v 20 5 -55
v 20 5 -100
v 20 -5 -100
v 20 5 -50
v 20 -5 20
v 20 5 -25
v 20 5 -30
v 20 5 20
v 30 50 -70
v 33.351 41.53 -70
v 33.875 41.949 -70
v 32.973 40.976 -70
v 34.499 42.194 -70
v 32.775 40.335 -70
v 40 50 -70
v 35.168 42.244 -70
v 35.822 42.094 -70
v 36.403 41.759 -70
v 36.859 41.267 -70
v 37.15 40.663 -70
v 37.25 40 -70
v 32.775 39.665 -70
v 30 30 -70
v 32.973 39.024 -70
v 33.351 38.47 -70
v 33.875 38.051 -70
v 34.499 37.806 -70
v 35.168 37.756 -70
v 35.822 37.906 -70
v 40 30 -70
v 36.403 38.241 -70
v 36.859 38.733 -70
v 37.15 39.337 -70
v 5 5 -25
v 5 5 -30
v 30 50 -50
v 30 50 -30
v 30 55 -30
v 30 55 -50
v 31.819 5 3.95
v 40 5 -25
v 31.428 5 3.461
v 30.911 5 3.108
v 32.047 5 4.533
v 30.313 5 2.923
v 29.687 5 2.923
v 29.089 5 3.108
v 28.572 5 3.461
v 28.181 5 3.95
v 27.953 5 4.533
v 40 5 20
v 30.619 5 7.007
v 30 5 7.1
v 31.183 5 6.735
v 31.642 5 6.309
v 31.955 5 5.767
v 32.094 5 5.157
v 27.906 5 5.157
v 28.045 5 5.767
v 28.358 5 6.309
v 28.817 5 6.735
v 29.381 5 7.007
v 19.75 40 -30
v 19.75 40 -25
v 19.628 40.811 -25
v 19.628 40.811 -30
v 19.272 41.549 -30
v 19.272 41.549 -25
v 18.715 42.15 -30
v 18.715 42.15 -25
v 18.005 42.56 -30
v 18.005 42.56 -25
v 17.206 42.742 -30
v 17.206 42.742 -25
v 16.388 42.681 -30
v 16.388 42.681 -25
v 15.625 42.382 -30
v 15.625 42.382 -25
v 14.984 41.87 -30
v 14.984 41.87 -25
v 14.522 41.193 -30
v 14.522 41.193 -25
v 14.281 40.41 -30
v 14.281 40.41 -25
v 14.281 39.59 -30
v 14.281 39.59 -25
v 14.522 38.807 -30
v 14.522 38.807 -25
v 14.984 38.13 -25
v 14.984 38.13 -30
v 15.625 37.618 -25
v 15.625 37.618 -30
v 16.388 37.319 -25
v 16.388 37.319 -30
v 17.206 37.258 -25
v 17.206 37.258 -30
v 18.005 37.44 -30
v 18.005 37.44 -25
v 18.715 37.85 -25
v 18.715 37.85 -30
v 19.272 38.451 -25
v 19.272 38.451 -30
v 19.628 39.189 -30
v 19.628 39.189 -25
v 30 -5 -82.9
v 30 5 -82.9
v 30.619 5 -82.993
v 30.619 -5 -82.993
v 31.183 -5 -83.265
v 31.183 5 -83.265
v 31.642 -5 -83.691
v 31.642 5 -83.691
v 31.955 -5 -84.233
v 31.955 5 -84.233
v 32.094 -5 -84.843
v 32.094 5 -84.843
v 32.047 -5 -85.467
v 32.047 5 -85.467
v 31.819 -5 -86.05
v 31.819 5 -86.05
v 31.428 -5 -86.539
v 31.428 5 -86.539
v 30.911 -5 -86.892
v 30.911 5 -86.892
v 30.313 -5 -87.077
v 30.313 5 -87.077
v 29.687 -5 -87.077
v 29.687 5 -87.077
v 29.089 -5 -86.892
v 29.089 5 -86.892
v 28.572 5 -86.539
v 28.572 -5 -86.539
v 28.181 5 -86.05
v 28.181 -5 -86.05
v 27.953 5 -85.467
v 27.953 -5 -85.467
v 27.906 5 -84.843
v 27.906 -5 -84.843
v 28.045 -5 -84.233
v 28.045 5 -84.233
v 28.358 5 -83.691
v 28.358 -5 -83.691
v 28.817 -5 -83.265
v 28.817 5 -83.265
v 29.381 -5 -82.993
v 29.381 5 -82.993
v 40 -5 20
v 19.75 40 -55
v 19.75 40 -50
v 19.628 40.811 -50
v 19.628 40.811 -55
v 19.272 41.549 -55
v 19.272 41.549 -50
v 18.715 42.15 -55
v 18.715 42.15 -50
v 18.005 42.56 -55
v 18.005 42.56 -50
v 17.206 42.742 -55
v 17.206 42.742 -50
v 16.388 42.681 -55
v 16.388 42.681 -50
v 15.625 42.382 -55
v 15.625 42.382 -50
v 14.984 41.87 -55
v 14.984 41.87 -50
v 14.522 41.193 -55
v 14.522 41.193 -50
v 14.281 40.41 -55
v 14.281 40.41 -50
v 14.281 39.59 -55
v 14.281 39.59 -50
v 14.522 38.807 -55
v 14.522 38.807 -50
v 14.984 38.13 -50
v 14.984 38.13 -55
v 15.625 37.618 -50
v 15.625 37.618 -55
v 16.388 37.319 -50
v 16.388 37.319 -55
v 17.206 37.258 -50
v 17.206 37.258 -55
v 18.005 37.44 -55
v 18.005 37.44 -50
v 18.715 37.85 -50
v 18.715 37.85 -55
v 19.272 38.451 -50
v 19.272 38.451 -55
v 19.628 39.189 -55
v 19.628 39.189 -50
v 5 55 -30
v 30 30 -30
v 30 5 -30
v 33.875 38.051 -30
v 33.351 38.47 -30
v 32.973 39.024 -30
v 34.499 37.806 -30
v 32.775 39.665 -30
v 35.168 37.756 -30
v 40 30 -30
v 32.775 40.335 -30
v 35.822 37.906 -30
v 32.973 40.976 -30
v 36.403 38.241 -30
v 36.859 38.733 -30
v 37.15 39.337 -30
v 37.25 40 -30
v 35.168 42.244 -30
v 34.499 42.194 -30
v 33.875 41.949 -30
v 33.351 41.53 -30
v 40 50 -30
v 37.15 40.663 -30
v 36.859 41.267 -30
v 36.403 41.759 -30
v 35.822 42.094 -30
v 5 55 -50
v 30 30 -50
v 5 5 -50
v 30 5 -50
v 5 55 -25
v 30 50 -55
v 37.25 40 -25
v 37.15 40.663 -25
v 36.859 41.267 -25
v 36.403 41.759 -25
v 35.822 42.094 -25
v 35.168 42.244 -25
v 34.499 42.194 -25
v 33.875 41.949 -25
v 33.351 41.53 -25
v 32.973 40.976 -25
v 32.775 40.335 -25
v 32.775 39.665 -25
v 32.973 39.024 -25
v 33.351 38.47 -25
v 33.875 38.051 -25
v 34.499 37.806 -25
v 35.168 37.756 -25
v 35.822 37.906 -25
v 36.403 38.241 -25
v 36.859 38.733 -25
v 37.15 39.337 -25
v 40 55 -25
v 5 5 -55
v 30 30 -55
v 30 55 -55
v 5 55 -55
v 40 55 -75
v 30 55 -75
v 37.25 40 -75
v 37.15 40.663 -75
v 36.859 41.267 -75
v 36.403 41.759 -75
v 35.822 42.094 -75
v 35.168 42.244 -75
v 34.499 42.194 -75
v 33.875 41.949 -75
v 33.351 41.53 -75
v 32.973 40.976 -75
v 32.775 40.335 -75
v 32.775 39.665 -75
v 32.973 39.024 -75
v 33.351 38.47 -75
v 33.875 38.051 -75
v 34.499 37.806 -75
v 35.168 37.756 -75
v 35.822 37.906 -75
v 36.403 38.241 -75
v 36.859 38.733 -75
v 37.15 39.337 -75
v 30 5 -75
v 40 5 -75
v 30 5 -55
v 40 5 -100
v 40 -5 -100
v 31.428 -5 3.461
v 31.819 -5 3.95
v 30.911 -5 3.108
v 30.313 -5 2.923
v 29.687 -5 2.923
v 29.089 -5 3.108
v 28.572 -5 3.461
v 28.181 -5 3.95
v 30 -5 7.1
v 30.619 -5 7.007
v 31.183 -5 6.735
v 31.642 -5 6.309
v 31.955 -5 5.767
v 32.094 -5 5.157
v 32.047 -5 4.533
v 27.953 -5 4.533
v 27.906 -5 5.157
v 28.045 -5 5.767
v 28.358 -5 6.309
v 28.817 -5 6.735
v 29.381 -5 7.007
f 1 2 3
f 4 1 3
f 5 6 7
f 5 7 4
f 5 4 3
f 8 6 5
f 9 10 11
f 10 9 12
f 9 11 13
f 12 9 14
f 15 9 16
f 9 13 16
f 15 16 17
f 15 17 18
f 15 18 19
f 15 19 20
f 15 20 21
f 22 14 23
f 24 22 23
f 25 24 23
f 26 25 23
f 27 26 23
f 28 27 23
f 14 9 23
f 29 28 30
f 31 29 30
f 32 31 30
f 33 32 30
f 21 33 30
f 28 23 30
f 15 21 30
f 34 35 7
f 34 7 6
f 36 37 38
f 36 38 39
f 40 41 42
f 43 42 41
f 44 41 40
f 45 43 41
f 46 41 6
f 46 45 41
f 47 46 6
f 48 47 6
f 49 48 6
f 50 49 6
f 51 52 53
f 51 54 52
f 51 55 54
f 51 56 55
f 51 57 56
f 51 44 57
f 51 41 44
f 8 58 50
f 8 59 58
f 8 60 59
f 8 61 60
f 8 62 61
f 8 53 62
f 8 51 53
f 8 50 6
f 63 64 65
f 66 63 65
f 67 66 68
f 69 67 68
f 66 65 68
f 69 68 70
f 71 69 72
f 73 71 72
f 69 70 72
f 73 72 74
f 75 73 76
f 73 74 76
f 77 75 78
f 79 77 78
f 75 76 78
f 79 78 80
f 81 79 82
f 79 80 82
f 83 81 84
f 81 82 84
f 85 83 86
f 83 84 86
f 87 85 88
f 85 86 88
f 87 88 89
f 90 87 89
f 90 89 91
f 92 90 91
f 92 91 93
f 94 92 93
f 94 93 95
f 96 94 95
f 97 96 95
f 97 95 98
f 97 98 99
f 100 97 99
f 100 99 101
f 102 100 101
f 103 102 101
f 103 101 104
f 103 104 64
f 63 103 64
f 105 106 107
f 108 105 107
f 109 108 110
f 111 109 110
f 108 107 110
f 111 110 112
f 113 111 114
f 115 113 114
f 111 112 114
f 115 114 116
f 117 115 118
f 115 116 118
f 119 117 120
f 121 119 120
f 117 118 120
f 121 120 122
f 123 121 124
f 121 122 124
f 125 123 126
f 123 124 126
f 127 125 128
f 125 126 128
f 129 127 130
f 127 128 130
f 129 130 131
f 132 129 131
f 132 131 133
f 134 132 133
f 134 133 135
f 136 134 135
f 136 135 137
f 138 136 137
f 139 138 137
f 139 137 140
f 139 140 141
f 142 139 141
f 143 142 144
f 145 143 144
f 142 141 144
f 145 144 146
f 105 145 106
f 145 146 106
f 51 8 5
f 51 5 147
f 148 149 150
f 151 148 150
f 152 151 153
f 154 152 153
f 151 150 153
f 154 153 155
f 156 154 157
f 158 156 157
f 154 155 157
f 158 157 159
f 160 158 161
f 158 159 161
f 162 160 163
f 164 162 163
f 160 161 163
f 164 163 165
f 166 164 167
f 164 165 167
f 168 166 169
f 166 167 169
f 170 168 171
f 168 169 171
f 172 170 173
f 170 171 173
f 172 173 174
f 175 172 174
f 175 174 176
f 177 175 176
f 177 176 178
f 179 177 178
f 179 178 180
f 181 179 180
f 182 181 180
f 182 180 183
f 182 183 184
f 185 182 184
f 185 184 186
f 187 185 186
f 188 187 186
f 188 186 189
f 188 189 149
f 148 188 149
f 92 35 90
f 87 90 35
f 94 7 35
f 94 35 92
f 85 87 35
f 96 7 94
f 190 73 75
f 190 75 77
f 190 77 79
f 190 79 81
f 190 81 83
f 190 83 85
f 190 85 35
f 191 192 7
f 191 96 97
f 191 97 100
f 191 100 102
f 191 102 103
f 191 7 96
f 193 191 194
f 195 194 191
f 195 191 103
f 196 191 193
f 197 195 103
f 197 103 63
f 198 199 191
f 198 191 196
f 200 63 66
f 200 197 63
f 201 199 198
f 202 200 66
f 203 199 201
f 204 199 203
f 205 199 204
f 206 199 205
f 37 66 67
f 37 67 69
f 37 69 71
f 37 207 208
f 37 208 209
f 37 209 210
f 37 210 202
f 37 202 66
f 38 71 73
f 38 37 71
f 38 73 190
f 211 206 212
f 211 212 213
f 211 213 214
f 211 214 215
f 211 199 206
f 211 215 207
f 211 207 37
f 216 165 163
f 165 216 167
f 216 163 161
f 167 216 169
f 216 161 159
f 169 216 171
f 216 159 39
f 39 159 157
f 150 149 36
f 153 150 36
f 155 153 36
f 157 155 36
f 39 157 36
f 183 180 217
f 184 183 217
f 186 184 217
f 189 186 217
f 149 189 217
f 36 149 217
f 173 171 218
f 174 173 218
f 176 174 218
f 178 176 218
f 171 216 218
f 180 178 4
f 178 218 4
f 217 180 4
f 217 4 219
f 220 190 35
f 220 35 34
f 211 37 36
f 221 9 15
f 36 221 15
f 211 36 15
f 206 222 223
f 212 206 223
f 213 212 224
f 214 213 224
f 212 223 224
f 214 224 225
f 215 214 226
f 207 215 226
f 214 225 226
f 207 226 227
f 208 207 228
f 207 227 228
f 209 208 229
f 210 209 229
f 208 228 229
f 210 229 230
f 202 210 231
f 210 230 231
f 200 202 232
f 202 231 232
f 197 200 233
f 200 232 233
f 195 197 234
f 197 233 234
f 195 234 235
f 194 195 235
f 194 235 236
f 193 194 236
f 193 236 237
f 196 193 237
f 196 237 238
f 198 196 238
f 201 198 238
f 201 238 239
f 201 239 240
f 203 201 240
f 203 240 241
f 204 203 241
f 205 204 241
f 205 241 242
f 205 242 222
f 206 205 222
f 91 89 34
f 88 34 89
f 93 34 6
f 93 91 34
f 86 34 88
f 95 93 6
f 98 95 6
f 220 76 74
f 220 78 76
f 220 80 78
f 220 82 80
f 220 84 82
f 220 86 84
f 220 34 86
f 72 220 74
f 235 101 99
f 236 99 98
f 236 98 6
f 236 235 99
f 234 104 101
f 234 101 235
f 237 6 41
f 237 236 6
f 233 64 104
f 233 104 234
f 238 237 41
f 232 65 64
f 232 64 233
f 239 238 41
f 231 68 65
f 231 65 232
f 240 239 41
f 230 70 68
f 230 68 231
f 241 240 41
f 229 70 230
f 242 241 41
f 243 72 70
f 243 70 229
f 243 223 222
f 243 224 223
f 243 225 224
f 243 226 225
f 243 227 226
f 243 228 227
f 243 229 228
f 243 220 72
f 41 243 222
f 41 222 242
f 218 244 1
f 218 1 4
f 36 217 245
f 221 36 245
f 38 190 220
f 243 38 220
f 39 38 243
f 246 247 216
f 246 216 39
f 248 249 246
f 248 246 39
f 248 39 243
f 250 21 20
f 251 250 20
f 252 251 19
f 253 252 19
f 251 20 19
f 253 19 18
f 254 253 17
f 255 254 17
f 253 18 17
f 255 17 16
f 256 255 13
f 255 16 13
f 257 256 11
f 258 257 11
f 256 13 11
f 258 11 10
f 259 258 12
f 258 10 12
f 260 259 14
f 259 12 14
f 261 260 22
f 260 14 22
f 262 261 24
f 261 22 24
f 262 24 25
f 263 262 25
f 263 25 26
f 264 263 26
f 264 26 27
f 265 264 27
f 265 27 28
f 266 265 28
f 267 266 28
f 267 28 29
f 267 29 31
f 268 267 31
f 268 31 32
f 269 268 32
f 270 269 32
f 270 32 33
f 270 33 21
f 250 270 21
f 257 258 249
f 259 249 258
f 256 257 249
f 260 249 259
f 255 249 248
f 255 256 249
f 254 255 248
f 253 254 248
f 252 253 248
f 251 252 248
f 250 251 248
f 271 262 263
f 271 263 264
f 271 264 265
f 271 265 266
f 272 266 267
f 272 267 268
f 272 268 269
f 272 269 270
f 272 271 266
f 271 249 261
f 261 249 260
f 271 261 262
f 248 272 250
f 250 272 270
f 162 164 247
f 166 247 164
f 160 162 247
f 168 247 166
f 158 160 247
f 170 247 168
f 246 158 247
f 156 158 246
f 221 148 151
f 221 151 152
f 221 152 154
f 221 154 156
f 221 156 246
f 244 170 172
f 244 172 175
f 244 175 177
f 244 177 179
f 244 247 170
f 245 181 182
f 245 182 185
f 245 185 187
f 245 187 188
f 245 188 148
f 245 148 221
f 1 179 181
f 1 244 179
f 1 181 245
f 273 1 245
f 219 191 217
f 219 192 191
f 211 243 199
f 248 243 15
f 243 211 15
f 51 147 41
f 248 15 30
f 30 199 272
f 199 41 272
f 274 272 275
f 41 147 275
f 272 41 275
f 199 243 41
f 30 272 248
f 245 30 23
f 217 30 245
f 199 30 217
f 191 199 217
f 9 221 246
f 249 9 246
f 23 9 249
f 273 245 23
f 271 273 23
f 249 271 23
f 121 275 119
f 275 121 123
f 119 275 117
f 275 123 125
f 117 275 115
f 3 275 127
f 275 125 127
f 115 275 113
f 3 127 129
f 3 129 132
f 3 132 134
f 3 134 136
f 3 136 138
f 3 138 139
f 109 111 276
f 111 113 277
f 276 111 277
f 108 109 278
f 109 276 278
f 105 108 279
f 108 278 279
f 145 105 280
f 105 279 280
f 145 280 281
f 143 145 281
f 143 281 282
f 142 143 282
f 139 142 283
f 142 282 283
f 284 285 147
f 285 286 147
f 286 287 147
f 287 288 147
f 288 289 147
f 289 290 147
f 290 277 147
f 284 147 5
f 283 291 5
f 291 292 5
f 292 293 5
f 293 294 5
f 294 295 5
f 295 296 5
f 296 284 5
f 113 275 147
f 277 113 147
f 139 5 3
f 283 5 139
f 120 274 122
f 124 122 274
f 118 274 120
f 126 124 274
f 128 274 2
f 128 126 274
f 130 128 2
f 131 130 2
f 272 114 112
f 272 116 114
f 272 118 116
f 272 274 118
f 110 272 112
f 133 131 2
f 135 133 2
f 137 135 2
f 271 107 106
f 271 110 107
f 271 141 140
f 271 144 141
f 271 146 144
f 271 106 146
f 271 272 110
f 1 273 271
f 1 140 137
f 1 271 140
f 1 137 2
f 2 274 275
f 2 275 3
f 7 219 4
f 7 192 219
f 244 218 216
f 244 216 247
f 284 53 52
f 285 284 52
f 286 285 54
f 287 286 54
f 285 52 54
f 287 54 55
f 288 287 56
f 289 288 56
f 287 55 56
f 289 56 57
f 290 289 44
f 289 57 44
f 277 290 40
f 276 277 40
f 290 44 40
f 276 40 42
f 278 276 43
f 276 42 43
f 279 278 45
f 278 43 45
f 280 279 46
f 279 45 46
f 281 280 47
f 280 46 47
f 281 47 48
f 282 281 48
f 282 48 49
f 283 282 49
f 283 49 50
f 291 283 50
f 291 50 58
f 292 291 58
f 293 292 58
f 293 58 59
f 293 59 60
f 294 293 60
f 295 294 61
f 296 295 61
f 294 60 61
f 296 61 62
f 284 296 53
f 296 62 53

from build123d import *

# Parameters (mm, degrees)
SKETCH4_W            = 40
SKETCH4_H            = 80
BOSS_EXTRUDE4_DEPTH  = 5
SKETCH5_W            = 10
SKETCH5_H            = 5
BOSS_EXTRUDE6_DEPTH  = 50
SKETCH7_W            = 10
SKETCH7_H            = 25
SKETCH7_H_2          = 5
BOSS_EXTRUDE7_DEPTH  = 20
SKETCH9_W            = 80
SKETCH9_H            = 5
BOSS_EXTRUDE9_DEPTH  = 10
SKETCH10_W           = 50
SKETCH10_H           = 5
BOSS_EXTRUDE10_DEPTH = 20
SKETCH11_R           = 2.25
CUT_EXTRUDE1_DEPTH   = 25
SKETCH12_R           = 4
SKETCH12_R_2         = 2.25
CUT_EXTRUDE2_DEPTH   = 2
SKETCH15_W           = 5
SKETCH15_H           = 50
BOSS_EXTRUDE11_DEPTH = 20
CUT_EXTRUDE4_REACH   = 89.464
SKETCH16_R           = 2.75
SKETCH19_W           = 5
SKETCH19_H           = 50
BOSS_EXTRUDE12_DEPTH = 5
SKETCH21_W           = 50
SKETCH21_H           = 100
BOSS_EXTRUDE14_DEPTH = 5
SKETCH22_W           = 50
SKETCH22_H           = 10
BOSS_EXTRUDE15_DEPTH = 20
SKETCH24_W           = 35
SKETCH24_H           = 5
CUT_EXTRUDE5_DEPTH   = 50
SKETCH25_W           = 10
SKETCH25_H           = 25
SKETCH25_H_2         = 5
BOSS_EXTRUDE16_DEPTH = 25
SKETCH26_W           = 10
SKETCH26_H           = 5
BOSS_EXTRUDE17_DEPTH = 20
BOSS_EXTRUDE18_START = 2
SKETCH27_R           = 4
SKETCH27_R_2         = 2.25
BOSS_EXTRUDE18_DEPTH = 2
SKETCH28_R           = 2.25
CUT_EXTRUDE6_DEPTH   = 50
SKETCH29_W           = 25
SKETCH29_H           = 5
BOSS_EXTRUDE19_DEPTH = 50
SKETCH31_R           = 2.75
CUT_EXTRUDE7_DEPTH   = 30
SKETCH32_W           = 30
SKETCH32_H           = 45
CUT_EXTRUDE8_DEPTH   = 10
SKETCH33_W           = 30
SKETCH33_H           = 10
CUT_EXTRUDE9_DEPTH   = 30
SKETCH35_R           = 2.1
CUT_EXTRUDE10_DEPTH  = 10


with BuildPart() as part:
    # Sketch4 → Boss-Extrude4 (new body)
    with BuildSketch(Plane(origin=(0, 0, 0), x_dir=(1, 0, 0), z_dir=(0, 1, 0))):
        with Locations((20, 40)):
            Rectangle(SKETCH4_W, SKETCH4_H)
    extrude(amount=BOSS_EXTRUDE4_DEPTH)

    # Sketch5 → Boss-Extrude6 (add)
    with BuildSketch(Plane(origin=(0, 5, 0), x_dir=(1, 0, 0), z_dir=(0, 1, 0))):
        with Locations((35, 52.5)):
            Rectangle(SKETCH5_W, SKETCH5_H)
        with Locations((35, 27.5)):
            Rectangle(SKETCH5_W, SKETCH5_H)
    extrude(amount=BOSS_EXTRUDE6_DEPTH)

    # Sketch7 → Boss-Extrude7 (add)
    with BuildSketch(Plane.XY.offset(-50)):
        with Locations((35, 17.5)):
            Rectangle(SKETCH7_W, SKETCH7_H)
        with Locations((35, 52.5)):
            Rectangle(SKETCH7_W, SKETCH7_H_2)
    extrude(amount=BOSS_EXTRUDE7_DEPTH)

    # Sketch9 → Boss-Extrude9 (add)
    with BuildSketch(Plane.ZY):
        with Locations((-40, 2.5)):
            Rectangle(SKETCH9_W, SKETCH9_H)
    extrude(amount=BOSS_EXTRUDE9_DEPTH)

    # Sketch10 → Boss-Extrude10 (add)
    with BuildSketch(Plane.XY):
        with Locations((15, 2.5)):
            Rectangle(SKETCH10_W, SKETCH10_H)
    extrude(amount=BOSS_EXTRUDE10_DEPTH)

    # Sketch11 → Cut-Extrude1 (cut, symmetric)
    with BuildSketch(Plane.XY.offset(-50)):
        with Locations((35, 40)):
            Circle(SKETCH11_R)
    extrude(amount=CUT_EXTRUDE1_DEPTH, both=True, mode=Mode.SUBTRACT)

    # Sketch12 → Cut-Extrude2 (cut)
    with BuildSketch(Plane.XY.offset(-25)):
        with Locations((35, 40)):
            Circle(SKETCH12_R)
        with Locations((35, 40)):
            Circle(SKETCH12_R_2, mode=Mode.SUBTRACT)
    extrude(amount=-CUT_EXTRUDE2_DEPTH, mode=Mode.SUBTRACT)

    # Sketch15 → Boss-Extrude11 (add)
    with BuildSketch(Plane.ZY.offset(-30)):
        with Locations((-52.5, 30)):
            Rectangle(SKETCH15_W, SKETCH15_H)
        with Locations((-27.5, 30)):
            Rectangle(SKETCH15_W, SKETCH15_H)
    extrude(amount=BOSS_EXTRUDE11_DEPTH)

    # Cut-Extrude4: up to this face of the body (flat: up to its plane)
    cut_extrude4_end = Plane(part.part.faces().sort_by_distance((24.892834991, 29.892834991, -55))[0])
    # Sketch16 → Cut-Extrude4 (cut, up to the picked face)
    with BuildSketch(Plane.XY.offset(-25), mode=Mode.PRIVATE) as cut_extrude4_sk1:
        with Locations((17, 40)):
            Circle(SKETCH16_R)
    cut_extrude4_tool1 = split(extrude(cut_extrude4_sk1.sketch, amount=-CUT_EXTRUDE4_REACH, mode=Mode.PRIVATE), bisect_by=cut_extrude4_end, keep=Keep.BOTH, mode=Mode.PRIVATE)
    add(cut_extrude4_tool1.solids().sort_by(Axis((17, 40, -25), (0, 0, -1)))[0], mode=Mode.SUBTRACT)

    # Sketch19 → Boss-Extrude12 (add)
    with BuildSketch(Plane.ZY.offset(-10)):
        with Locations((-52.5, 30)):
            Rectangle(SKETCH19_W, SKETCH19_H)
        with Locations((-27.5, 30)):
            Rectangle(SKETCH19_W, SKETCH19_H)
    extrude(amount=BOSS_EXTRUDE12_DEPTH)

    # Sketch21 → Boss-Extrude14 (add)
    with BuildSketch(Plane.XZ):
        with Locations((15, -30)):
            Rectangle(SKETCH21_W, SKETCH21_H)
    extrude(amount=BOSS_EXTRUDE14_DEPTH)

    # Sketch22 → Boss-Extrude15 (add)
    with BuildSketch(Plane(origin=(0, 0, -80), x_dir=(-1, 0, 0), z_dir=(0, 0, -1))):
        with Locations((-15, 0)):
            Rectangle(SKETCH22_W, SKETCH22_H)
    extrude(amount=BOSS_EXTRUDE15_DEPTH)

    # Sketch24 → Cut-Extrude5 (cut)
    with BuildSketch(Plane(origin=(0, 55, 0), x_dir=(1, 0, 0), z_dir=(0, 1, 0))):
        with Locations((22.5, 52.5)):
            Rectangle(SKETCH24_W, SKETCH24_H)
    extrude(amount=-CUT_EXTRUDE5_DEPTH, mode=Mode.SUBTRACT)

    # Sketch25 → Boss-Extrude16 (add)
    with BuildSketch(Plane(origin=(0, 0, -50), x_dir=(-1, 0, 0), z_dir=(0, 0, -1))):
        with Locations((-35, 17.5)):
            Rectangle(SKETCH25_W, SKETCH25_H)
        with Locations((-35, 52.5)):
            Rectangle(SKETCH25_W, SKETCH25_H_2)
    extrude(amount=BOSS_EXTRUDE16_DEPTH)

    # Sketch26 → Boss-Extrude17 (add)
    with BuildSketch(Plane(origin=(0, 30, 0), x_dir=(1, 0, 0), z_dir=(0, 1, 0))):
        with Locations((35, 72.5)):
            Rectangle(SKETCH26_W, SKETCH26_H)
    extrude(amount=BOSS_EXTRUDE17_DEPTH)

    # Sketch27 → Boss-Extrude18 (add)
    with BuildSketch(Plane.XY.offset(-27).offset(BOSS_EXTRUDE18_START)):
        with Locations((35, 40)):
            Circle(SKETCH27_R)
        with Locations((35, 40)):
            Circle(SKETCH27_R_2, mode=Mode.SUBTRACT)
    extrude(amount=-BOSS_EXTRUDE18_DEPTH)

    # Sketch28 → Cut-Extrude6 (cut)
    with BuildSketch(Plane.XY.offset(-25)):
        with Locations((35, 40)):
            Circle(SKETCH28_R)
    extrude(amount=-CUT_EXTRUDE6_DEPTH, mode=Mode.SUBTRACT)

    # Sketch29 → Boss-Extrude19 (add)
    with BuildSketch(Plane(origin=(0, 5, 0), x_dir=(1, 0, 0), z_dir=(0, 1, 0))):
        with Locations((17.5, 52.5)):
            Rectangle(SKETCH29_W, SKETCH29_H)
    extrude(amount=BOSS_EXTRUDE19_DEPTH)

    # Sketch31 → Cut-Extrude7 (cut)
    with BuildSketch(Plane.XY.offset(-25)):
        with Locations((17, 40)):
            Circle(SKETCH31_R)
    extrude(amount=-CUT_EXTRUDE7_DEPTH, mode=Mode.SUBTRACT)

    # Sketch32 → Cut-Extrude8 (cut)
    with BuildSketch(Plane(origin=(0, 5, 0), x_dir=(1, 0, 0), z_dir=(0, 1, 0))):
        with Locations((5, 77.5)):
            Rectangle(SKETCH32_W, SKETCH32_H)
        with Locations((5, 2.5)):
            Rectangle(SKETCH32_W, SKETCH32_H)
    extrude(amount=-CUT_EXTRUDE8_DEPTH, mode=Mode.SUBTRACT)

    # Sketch33 → Cut-Extrude9 (cut)
    with BuildSketch(Plane.ZY.offset(10)):
        with Locations((-40, 0)):
            Rectangle(SKETCH33_W, SKETCH33_H)
    extrude(amount=-CUT_EXTRUDE9_DEPTH, mode=Mode.SUBTRACT)

    # Sketch35 → Cut-Extrude10 (cut)
    with BuildSketch(Plane(origin=(0, 5, 0), x_dir=(1, 0, 0), z_dir=(0, 1, 0))):
        with Locations(Location((30, 85, 0), (0, 0, 270))):
            Circle(SKETCH35_R)
        with Locations(Location((30, -5, 0), (0, 0, 270))):
            Circle(SKETCH35_R)
    extrude(amount=-CUT_EXTRUDE10_DEPTH, mode=Mode.SUBTRACT)


solid = part.part
